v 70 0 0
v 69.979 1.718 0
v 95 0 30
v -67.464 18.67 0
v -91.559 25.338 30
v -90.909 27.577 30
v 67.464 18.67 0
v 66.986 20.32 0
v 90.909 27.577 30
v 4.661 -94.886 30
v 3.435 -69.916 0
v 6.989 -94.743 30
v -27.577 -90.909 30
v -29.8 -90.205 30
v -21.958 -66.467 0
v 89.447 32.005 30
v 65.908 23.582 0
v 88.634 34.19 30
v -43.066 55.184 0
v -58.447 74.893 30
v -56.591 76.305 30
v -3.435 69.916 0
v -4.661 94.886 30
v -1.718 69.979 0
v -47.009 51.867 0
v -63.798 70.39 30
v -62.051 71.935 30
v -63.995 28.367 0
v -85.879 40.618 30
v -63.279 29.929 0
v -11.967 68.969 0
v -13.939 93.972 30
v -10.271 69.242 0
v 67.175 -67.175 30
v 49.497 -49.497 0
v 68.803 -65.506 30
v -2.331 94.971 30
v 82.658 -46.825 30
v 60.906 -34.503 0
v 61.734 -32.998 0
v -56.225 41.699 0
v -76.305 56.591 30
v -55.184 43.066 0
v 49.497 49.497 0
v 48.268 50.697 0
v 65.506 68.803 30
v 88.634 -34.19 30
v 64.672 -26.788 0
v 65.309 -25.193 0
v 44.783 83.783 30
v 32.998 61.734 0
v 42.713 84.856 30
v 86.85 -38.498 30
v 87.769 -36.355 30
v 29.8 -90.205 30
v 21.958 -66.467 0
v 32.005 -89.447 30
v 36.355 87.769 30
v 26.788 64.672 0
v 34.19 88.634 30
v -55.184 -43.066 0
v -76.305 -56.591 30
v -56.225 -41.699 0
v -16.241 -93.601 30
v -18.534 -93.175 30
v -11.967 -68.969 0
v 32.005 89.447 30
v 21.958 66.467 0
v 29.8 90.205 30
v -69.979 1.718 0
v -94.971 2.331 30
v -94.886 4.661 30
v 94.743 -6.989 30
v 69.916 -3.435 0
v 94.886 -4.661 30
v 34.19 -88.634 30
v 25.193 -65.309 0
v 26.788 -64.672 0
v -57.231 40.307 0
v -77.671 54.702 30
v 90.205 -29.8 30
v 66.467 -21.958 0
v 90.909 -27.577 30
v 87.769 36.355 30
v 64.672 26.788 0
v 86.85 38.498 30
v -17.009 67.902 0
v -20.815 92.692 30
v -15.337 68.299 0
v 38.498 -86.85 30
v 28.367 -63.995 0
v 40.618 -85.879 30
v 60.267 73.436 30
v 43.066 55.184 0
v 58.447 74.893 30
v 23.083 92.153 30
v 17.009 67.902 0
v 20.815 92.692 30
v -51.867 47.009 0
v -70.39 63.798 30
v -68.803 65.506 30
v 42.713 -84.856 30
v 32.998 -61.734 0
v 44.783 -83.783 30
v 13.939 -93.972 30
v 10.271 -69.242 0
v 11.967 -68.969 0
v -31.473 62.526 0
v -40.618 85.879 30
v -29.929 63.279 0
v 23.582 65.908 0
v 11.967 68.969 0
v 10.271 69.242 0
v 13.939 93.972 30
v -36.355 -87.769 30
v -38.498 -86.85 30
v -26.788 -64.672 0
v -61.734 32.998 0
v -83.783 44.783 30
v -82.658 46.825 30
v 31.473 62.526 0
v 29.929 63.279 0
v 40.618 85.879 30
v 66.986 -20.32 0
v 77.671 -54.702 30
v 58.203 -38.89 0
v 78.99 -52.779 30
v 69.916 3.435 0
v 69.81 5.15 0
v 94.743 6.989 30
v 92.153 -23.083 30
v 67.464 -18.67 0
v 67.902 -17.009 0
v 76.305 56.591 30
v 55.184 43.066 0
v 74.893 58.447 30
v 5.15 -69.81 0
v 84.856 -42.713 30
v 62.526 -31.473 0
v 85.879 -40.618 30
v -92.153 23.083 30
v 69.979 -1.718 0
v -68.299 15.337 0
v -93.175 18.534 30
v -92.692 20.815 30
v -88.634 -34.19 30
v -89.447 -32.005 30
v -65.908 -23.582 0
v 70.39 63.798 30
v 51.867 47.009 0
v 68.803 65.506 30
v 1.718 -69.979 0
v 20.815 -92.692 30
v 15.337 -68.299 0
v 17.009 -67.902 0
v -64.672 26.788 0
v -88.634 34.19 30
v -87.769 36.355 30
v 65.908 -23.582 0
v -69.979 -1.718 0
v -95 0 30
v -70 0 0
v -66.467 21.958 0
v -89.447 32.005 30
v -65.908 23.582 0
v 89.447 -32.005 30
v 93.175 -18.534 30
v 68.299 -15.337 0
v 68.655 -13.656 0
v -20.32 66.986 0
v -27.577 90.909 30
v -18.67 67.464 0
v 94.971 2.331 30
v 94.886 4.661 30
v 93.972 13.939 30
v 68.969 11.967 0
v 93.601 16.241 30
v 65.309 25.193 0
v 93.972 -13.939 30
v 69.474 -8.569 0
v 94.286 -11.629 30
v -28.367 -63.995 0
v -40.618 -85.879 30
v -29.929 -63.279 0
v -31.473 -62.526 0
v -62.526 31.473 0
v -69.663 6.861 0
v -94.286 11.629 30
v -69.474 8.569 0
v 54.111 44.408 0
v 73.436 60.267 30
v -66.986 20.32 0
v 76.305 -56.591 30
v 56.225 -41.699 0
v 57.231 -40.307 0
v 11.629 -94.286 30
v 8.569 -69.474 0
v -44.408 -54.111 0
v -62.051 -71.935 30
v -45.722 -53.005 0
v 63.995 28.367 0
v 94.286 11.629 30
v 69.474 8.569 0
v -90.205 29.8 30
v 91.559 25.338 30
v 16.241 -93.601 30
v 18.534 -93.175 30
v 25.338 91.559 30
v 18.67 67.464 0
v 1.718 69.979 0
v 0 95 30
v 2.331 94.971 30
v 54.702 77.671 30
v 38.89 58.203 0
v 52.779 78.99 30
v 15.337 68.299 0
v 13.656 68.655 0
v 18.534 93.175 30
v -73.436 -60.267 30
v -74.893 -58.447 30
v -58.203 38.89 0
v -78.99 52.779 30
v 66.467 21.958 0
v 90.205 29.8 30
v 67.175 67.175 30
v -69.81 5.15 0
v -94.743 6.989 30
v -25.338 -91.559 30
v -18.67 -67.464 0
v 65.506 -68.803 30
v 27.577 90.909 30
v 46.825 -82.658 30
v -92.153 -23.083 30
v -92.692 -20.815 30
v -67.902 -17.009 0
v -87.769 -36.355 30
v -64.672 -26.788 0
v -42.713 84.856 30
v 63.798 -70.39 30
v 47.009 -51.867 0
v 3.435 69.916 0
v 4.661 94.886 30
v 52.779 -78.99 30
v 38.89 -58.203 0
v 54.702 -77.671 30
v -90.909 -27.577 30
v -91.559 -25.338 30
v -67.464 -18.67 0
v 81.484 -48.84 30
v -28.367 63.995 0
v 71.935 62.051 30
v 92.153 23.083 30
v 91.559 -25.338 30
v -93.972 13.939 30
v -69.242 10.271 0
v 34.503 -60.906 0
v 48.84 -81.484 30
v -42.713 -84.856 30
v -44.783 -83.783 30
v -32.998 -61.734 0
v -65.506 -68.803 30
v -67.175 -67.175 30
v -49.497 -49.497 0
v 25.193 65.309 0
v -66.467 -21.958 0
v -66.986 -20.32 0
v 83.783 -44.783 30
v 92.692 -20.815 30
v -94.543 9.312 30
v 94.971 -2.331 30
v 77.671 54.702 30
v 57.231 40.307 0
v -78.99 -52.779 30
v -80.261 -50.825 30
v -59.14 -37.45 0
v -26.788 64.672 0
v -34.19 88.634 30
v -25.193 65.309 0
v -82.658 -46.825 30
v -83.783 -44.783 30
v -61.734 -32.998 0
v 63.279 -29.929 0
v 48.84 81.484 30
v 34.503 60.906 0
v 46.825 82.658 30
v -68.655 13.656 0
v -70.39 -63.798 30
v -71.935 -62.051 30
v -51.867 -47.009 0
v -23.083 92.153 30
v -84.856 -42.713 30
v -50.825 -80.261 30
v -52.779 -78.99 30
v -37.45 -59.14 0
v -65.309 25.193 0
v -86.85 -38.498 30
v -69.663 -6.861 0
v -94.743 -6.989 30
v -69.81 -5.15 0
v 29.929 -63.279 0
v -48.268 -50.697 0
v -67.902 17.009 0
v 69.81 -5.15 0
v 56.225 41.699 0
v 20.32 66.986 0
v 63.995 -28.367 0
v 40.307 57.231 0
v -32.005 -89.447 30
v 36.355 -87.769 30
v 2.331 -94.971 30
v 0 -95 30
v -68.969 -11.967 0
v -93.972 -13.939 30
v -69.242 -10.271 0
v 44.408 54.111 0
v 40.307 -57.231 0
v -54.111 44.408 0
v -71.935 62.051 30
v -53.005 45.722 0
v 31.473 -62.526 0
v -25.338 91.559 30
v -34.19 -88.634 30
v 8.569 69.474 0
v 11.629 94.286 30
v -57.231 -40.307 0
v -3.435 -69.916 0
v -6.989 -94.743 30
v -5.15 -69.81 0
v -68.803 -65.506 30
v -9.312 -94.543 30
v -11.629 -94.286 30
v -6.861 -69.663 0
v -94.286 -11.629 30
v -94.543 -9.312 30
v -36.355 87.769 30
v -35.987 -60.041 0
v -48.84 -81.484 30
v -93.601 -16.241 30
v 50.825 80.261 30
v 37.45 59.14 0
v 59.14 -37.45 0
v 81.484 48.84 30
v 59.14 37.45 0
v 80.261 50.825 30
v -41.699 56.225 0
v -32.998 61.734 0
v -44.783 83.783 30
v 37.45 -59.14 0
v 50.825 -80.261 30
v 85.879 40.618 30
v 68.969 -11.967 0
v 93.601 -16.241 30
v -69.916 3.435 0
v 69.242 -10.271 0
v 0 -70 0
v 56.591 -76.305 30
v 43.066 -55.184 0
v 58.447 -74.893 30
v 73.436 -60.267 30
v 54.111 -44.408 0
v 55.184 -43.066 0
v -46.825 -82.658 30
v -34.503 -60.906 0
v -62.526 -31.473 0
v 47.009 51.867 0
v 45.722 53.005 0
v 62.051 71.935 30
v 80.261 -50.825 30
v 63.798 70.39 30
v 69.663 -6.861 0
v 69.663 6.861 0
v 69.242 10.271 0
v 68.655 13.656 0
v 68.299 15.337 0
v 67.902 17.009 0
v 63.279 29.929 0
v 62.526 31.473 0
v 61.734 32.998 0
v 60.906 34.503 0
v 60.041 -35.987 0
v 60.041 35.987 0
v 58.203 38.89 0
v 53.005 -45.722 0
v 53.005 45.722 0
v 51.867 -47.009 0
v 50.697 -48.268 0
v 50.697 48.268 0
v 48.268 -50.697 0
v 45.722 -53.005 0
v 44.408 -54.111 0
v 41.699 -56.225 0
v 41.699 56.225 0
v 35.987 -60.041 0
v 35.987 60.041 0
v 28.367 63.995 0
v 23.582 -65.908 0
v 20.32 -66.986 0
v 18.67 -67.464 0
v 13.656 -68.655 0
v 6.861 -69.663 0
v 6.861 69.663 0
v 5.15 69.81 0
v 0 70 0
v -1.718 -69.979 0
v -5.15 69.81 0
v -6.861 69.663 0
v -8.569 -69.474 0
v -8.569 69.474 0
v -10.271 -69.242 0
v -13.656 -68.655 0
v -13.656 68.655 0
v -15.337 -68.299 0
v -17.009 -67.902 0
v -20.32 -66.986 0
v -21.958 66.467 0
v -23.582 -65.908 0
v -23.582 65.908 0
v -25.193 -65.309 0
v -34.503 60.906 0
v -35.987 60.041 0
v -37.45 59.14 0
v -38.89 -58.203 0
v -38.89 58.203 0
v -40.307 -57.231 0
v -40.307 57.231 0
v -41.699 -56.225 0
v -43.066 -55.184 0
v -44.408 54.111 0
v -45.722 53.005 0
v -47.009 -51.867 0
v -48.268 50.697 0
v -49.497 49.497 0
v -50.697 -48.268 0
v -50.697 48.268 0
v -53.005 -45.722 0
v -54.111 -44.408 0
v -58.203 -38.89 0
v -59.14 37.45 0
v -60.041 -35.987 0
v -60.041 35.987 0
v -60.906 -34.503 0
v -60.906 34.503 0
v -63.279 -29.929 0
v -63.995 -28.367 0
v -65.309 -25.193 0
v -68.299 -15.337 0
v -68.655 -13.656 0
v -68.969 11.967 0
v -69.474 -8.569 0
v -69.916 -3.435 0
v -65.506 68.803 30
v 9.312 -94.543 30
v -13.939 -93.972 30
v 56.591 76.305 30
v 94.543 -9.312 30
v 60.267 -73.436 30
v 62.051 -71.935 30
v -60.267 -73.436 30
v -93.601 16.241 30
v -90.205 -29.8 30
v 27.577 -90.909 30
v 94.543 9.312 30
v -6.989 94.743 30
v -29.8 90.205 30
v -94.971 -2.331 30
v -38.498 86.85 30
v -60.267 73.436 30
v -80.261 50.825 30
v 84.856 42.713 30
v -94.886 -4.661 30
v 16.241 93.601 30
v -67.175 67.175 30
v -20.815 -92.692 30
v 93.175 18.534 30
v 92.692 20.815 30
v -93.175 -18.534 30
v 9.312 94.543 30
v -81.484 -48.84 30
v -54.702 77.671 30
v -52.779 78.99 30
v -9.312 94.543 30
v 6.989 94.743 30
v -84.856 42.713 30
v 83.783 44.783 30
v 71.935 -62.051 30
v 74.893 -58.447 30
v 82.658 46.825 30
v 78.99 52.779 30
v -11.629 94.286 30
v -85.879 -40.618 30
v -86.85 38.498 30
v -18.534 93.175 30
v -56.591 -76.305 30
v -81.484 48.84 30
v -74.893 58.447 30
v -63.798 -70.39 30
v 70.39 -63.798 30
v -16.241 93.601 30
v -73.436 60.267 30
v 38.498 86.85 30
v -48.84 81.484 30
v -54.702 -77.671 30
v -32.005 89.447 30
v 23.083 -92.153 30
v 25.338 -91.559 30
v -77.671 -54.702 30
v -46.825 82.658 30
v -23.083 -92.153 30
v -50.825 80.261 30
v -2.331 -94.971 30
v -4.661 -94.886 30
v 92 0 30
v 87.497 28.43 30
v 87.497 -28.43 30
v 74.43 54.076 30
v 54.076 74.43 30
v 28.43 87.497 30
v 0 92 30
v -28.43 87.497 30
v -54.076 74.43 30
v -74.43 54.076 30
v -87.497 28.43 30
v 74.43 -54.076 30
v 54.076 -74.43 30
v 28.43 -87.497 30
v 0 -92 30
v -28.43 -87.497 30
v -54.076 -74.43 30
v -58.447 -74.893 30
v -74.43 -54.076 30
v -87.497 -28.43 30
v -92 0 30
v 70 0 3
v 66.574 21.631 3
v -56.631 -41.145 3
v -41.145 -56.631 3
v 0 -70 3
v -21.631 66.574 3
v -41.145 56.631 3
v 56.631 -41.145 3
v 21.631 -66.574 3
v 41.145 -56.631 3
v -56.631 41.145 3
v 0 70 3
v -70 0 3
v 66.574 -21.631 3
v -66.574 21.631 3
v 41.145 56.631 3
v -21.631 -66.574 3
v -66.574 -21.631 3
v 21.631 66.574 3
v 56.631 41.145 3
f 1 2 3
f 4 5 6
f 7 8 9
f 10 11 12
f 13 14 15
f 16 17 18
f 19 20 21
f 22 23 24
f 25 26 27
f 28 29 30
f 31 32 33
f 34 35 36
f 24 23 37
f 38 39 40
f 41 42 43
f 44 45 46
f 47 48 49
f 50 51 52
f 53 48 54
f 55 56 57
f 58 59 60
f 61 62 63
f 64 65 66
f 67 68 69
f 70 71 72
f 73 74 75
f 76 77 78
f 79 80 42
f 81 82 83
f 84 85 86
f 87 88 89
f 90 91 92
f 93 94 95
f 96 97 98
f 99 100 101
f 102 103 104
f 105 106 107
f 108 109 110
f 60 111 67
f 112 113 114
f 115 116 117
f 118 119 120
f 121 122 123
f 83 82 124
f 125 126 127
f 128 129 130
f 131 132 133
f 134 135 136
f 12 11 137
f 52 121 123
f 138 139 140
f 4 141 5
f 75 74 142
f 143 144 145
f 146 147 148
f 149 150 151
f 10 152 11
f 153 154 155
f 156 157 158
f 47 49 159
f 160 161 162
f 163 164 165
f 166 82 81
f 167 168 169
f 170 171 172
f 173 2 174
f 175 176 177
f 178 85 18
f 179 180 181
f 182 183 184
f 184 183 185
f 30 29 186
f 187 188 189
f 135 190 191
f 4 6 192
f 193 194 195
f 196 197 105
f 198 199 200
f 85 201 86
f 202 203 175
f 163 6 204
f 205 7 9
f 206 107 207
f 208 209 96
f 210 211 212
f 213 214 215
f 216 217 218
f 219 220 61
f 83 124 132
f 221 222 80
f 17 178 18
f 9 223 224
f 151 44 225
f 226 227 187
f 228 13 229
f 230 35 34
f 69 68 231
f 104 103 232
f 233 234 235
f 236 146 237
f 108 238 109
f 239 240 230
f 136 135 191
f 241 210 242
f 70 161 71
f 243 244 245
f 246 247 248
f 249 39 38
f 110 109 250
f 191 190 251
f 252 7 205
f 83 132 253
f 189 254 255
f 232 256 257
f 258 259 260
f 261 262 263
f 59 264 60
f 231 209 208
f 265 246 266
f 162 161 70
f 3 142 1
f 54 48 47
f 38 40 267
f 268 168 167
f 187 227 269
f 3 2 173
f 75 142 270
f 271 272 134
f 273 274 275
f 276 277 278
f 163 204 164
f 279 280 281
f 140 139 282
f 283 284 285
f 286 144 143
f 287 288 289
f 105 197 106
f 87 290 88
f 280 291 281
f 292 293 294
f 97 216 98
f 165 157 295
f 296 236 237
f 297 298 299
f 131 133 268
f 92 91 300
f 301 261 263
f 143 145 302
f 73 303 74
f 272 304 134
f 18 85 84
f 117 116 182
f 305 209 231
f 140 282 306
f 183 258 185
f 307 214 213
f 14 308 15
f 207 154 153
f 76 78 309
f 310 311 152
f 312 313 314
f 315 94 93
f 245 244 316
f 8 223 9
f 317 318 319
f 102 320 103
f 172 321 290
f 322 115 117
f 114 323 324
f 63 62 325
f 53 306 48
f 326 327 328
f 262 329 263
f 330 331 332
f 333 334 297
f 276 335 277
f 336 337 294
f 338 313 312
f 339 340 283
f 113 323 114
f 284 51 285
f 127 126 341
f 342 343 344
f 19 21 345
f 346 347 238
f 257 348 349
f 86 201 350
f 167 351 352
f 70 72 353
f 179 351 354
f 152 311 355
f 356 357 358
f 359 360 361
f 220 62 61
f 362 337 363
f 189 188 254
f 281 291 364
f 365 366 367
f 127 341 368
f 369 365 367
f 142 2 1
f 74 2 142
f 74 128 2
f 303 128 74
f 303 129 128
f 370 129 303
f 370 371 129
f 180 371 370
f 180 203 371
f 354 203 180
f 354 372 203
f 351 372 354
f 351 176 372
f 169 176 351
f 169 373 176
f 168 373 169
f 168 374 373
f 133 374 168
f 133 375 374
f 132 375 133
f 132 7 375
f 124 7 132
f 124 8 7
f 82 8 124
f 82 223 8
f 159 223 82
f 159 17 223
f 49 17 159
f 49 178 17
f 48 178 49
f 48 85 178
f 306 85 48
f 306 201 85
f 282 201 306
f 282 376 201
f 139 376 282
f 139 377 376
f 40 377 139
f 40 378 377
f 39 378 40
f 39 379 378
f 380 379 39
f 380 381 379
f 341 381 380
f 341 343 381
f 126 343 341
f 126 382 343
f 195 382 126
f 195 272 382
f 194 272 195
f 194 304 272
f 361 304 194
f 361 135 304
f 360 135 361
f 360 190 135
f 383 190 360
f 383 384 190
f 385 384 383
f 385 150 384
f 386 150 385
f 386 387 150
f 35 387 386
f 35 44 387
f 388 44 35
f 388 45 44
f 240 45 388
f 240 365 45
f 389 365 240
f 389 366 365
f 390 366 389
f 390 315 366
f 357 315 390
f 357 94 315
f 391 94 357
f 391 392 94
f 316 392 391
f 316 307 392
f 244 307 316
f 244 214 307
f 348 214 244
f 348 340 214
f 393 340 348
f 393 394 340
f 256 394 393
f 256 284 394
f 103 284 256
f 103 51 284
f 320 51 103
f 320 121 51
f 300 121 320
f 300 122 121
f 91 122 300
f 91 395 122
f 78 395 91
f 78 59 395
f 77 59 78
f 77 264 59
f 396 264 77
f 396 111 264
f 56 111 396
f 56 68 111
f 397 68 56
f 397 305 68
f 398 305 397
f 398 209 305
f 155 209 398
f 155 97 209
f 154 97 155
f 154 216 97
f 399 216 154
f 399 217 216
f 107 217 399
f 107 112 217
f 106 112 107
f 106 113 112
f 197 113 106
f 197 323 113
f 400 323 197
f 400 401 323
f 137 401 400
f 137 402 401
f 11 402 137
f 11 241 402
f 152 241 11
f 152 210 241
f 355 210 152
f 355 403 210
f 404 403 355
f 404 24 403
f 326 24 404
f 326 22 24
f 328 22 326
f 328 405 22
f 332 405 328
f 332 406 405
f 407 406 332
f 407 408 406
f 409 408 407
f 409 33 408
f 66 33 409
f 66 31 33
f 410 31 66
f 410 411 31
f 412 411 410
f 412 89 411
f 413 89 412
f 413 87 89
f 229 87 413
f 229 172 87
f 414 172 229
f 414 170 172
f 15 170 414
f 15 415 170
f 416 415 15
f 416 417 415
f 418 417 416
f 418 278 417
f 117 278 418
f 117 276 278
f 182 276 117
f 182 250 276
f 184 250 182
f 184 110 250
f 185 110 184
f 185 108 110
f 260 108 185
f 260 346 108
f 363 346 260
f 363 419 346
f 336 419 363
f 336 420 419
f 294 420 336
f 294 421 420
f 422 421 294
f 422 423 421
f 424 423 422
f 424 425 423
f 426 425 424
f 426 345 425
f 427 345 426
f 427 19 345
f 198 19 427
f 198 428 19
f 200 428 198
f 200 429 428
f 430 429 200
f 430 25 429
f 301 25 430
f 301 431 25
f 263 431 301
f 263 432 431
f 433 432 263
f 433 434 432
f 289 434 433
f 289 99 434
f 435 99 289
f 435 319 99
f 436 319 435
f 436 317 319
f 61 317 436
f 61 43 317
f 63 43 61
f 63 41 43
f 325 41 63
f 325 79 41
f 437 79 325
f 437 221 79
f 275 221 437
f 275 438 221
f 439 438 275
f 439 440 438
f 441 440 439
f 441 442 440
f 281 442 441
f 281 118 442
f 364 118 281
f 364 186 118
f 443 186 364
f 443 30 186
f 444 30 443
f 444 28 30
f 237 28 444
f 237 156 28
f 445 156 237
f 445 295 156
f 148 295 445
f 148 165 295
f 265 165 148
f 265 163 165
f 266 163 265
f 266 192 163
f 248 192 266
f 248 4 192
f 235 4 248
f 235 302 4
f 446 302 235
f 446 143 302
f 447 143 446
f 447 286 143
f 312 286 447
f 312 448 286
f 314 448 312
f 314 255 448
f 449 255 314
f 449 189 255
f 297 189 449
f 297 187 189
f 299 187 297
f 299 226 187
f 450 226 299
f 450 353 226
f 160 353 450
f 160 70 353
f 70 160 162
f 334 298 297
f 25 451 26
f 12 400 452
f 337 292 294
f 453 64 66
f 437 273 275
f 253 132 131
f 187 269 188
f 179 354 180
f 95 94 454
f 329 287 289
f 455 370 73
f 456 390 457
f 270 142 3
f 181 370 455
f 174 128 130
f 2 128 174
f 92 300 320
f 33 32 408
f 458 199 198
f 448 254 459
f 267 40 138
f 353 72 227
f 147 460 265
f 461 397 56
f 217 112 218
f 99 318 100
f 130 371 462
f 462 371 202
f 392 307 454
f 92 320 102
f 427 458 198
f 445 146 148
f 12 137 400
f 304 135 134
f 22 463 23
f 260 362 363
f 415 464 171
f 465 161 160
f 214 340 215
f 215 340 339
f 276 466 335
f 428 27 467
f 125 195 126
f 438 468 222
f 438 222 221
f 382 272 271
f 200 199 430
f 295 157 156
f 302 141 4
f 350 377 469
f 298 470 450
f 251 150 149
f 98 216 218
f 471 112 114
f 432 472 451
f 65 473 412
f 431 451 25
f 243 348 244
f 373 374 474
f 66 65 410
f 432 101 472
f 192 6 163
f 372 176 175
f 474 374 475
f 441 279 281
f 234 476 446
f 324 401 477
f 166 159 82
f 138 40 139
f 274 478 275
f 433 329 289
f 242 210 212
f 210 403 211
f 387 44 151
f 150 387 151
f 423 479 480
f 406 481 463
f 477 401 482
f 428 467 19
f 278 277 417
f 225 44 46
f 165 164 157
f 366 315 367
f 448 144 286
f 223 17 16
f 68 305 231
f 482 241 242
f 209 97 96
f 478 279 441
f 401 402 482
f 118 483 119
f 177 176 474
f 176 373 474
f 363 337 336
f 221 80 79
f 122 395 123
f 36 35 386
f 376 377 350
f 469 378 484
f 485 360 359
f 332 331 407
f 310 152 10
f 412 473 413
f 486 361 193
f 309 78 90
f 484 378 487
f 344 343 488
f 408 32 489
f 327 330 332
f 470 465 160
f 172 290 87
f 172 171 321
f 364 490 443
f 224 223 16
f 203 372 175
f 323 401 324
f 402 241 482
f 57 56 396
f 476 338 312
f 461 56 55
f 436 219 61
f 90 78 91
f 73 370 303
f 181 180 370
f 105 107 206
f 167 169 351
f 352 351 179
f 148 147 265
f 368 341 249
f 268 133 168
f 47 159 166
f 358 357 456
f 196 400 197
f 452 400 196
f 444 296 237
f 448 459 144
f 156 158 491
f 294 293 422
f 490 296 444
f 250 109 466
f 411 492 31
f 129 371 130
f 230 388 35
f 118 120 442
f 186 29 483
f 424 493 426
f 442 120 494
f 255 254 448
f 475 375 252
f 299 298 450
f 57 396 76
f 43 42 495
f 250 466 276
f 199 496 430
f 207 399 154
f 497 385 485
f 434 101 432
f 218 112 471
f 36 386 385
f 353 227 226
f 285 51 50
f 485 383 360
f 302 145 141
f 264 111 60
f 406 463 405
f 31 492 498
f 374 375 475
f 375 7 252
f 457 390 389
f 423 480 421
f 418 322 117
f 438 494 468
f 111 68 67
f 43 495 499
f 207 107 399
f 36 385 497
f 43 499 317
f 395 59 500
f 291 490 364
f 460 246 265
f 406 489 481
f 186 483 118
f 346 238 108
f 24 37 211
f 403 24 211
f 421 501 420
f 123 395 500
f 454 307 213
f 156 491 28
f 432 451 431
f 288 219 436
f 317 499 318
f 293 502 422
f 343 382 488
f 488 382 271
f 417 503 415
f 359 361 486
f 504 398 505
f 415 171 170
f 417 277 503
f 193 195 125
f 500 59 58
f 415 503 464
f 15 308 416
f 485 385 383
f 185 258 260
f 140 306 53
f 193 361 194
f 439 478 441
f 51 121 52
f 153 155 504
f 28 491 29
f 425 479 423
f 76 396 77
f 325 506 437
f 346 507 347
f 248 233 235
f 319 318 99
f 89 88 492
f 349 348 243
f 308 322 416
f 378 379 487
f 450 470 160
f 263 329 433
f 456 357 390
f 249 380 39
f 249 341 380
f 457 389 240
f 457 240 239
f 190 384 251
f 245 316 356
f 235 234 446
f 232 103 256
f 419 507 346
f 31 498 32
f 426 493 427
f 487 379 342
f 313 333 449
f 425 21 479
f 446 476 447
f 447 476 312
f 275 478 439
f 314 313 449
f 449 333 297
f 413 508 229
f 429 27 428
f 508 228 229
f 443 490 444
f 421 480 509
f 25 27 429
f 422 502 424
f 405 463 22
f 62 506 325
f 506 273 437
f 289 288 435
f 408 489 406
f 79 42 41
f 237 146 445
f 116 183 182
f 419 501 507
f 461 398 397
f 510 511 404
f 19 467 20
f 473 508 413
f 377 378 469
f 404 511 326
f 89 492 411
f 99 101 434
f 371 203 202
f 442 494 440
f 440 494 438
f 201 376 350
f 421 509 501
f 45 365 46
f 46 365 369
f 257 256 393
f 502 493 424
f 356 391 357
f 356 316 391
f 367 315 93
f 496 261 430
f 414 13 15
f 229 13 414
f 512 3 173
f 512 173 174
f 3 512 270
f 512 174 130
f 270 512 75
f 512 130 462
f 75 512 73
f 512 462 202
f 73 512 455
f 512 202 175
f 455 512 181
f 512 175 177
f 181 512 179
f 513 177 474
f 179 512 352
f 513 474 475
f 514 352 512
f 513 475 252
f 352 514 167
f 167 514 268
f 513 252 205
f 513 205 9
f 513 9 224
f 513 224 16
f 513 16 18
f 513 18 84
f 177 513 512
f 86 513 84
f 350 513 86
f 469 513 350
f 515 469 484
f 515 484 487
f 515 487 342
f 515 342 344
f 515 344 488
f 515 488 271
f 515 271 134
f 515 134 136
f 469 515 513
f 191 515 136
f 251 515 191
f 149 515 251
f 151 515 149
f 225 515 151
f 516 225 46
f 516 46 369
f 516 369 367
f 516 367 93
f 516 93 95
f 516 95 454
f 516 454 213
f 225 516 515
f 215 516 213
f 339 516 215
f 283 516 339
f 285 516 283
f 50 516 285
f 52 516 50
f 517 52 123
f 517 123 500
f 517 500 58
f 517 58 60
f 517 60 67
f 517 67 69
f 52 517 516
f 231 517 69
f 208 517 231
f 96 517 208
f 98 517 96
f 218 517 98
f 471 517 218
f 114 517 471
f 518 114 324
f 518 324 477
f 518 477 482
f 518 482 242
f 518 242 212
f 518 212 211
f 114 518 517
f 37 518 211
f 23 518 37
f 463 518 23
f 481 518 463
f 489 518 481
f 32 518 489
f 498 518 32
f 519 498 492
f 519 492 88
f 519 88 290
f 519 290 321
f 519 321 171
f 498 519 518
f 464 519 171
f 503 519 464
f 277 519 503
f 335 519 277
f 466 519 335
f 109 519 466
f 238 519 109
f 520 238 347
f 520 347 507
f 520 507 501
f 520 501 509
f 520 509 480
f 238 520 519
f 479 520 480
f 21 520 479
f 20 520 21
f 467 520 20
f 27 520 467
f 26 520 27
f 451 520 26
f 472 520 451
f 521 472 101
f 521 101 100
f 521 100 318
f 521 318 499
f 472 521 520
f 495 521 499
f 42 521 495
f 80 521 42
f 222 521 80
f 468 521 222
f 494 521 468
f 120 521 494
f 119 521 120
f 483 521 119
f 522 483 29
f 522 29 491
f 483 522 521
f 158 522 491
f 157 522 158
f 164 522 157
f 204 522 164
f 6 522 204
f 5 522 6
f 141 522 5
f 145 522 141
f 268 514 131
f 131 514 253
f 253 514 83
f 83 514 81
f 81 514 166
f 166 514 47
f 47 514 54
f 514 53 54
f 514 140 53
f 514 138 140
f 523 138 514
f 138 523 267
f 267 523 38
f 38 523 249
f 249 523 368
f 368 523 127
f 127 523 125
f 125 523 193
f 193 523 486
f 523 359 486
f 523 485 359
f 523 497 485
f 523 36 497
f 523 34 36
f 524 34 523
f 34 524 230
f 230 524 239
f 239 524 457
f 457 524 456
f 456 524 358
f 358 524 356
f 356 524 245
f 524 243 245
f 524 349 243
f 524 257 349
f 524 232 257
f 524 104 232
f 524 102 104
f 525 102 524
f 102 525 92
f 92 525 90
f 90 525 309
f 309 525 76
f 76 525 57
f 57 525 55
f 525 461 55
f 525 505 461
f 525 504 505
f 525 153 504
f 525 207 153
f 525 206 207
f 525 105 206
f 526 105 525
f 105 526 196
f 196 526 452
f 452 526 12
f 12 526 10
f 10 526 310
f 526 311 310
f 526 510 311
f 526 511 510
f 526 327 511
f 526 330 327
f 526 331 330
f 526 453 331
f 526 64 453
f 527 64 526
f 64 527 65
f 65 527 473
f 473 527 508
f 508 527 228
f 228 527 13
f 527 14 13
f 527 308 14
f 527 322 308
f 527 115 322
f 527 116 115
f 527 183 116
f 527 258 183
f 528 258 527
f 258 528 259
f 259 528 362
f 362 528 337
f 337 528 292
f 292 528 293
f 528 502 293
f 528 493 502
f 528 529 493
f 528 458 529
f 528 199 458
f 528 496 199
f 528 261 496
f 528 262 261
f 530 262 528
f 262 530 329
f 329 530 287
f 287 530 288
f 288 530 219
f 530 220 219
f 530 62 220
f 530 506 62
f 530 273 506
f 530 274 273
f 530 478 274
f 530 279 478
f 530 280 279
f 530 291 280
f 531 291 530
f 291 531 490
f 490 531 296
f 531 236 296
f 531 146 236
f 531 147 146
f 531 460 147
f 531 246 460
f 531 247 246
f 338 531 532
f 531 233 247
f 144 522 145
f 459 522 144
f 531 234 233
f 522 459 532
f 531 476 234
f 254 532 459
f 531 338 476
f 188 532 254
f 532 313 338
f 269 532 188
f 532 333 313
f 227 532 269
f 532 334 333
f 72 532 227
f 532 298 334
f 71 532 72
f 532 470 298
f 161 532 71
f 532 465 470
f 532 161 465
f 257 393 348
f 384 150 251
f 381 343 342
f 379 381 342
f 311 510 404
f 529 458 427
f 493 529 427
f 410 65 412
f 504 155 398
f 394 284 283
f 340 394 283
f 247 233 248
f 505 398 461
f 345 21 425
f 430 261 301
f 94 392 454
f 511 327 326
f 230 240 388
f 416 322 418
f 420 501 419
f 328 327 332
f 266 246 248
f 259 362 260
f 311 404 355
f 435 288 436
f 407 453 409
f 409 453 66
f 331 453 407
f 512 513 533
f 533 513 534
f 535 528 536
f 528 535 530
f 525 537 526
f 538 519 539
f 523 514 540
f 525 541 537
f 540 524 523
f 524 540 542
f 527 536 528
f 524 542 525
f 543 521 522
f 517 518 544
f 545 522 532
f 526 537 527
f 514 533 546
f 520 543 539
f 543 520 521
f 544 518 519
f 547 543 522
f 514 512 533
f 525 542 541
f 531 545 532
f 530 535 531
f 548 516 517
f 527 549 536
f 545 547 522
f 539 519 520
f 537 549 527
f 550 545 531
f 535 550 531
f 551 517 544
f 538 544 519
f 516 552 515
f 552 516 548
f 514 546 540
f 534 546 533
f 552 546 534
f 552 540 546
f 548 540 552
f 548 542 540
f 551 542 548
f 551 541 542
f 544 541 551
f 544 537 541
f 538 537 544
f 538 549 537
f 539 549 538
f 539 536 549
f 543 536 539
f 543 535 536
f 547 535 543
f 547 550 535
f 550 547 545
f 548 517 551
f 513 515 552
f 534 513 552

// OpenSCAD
difference() {
cylinder(h=30,r1=70, r2=95,$fn=256);
translate([0,0,3])
cylinder(h=27,r1=70, r2=92,$fn=20 );
    
}
